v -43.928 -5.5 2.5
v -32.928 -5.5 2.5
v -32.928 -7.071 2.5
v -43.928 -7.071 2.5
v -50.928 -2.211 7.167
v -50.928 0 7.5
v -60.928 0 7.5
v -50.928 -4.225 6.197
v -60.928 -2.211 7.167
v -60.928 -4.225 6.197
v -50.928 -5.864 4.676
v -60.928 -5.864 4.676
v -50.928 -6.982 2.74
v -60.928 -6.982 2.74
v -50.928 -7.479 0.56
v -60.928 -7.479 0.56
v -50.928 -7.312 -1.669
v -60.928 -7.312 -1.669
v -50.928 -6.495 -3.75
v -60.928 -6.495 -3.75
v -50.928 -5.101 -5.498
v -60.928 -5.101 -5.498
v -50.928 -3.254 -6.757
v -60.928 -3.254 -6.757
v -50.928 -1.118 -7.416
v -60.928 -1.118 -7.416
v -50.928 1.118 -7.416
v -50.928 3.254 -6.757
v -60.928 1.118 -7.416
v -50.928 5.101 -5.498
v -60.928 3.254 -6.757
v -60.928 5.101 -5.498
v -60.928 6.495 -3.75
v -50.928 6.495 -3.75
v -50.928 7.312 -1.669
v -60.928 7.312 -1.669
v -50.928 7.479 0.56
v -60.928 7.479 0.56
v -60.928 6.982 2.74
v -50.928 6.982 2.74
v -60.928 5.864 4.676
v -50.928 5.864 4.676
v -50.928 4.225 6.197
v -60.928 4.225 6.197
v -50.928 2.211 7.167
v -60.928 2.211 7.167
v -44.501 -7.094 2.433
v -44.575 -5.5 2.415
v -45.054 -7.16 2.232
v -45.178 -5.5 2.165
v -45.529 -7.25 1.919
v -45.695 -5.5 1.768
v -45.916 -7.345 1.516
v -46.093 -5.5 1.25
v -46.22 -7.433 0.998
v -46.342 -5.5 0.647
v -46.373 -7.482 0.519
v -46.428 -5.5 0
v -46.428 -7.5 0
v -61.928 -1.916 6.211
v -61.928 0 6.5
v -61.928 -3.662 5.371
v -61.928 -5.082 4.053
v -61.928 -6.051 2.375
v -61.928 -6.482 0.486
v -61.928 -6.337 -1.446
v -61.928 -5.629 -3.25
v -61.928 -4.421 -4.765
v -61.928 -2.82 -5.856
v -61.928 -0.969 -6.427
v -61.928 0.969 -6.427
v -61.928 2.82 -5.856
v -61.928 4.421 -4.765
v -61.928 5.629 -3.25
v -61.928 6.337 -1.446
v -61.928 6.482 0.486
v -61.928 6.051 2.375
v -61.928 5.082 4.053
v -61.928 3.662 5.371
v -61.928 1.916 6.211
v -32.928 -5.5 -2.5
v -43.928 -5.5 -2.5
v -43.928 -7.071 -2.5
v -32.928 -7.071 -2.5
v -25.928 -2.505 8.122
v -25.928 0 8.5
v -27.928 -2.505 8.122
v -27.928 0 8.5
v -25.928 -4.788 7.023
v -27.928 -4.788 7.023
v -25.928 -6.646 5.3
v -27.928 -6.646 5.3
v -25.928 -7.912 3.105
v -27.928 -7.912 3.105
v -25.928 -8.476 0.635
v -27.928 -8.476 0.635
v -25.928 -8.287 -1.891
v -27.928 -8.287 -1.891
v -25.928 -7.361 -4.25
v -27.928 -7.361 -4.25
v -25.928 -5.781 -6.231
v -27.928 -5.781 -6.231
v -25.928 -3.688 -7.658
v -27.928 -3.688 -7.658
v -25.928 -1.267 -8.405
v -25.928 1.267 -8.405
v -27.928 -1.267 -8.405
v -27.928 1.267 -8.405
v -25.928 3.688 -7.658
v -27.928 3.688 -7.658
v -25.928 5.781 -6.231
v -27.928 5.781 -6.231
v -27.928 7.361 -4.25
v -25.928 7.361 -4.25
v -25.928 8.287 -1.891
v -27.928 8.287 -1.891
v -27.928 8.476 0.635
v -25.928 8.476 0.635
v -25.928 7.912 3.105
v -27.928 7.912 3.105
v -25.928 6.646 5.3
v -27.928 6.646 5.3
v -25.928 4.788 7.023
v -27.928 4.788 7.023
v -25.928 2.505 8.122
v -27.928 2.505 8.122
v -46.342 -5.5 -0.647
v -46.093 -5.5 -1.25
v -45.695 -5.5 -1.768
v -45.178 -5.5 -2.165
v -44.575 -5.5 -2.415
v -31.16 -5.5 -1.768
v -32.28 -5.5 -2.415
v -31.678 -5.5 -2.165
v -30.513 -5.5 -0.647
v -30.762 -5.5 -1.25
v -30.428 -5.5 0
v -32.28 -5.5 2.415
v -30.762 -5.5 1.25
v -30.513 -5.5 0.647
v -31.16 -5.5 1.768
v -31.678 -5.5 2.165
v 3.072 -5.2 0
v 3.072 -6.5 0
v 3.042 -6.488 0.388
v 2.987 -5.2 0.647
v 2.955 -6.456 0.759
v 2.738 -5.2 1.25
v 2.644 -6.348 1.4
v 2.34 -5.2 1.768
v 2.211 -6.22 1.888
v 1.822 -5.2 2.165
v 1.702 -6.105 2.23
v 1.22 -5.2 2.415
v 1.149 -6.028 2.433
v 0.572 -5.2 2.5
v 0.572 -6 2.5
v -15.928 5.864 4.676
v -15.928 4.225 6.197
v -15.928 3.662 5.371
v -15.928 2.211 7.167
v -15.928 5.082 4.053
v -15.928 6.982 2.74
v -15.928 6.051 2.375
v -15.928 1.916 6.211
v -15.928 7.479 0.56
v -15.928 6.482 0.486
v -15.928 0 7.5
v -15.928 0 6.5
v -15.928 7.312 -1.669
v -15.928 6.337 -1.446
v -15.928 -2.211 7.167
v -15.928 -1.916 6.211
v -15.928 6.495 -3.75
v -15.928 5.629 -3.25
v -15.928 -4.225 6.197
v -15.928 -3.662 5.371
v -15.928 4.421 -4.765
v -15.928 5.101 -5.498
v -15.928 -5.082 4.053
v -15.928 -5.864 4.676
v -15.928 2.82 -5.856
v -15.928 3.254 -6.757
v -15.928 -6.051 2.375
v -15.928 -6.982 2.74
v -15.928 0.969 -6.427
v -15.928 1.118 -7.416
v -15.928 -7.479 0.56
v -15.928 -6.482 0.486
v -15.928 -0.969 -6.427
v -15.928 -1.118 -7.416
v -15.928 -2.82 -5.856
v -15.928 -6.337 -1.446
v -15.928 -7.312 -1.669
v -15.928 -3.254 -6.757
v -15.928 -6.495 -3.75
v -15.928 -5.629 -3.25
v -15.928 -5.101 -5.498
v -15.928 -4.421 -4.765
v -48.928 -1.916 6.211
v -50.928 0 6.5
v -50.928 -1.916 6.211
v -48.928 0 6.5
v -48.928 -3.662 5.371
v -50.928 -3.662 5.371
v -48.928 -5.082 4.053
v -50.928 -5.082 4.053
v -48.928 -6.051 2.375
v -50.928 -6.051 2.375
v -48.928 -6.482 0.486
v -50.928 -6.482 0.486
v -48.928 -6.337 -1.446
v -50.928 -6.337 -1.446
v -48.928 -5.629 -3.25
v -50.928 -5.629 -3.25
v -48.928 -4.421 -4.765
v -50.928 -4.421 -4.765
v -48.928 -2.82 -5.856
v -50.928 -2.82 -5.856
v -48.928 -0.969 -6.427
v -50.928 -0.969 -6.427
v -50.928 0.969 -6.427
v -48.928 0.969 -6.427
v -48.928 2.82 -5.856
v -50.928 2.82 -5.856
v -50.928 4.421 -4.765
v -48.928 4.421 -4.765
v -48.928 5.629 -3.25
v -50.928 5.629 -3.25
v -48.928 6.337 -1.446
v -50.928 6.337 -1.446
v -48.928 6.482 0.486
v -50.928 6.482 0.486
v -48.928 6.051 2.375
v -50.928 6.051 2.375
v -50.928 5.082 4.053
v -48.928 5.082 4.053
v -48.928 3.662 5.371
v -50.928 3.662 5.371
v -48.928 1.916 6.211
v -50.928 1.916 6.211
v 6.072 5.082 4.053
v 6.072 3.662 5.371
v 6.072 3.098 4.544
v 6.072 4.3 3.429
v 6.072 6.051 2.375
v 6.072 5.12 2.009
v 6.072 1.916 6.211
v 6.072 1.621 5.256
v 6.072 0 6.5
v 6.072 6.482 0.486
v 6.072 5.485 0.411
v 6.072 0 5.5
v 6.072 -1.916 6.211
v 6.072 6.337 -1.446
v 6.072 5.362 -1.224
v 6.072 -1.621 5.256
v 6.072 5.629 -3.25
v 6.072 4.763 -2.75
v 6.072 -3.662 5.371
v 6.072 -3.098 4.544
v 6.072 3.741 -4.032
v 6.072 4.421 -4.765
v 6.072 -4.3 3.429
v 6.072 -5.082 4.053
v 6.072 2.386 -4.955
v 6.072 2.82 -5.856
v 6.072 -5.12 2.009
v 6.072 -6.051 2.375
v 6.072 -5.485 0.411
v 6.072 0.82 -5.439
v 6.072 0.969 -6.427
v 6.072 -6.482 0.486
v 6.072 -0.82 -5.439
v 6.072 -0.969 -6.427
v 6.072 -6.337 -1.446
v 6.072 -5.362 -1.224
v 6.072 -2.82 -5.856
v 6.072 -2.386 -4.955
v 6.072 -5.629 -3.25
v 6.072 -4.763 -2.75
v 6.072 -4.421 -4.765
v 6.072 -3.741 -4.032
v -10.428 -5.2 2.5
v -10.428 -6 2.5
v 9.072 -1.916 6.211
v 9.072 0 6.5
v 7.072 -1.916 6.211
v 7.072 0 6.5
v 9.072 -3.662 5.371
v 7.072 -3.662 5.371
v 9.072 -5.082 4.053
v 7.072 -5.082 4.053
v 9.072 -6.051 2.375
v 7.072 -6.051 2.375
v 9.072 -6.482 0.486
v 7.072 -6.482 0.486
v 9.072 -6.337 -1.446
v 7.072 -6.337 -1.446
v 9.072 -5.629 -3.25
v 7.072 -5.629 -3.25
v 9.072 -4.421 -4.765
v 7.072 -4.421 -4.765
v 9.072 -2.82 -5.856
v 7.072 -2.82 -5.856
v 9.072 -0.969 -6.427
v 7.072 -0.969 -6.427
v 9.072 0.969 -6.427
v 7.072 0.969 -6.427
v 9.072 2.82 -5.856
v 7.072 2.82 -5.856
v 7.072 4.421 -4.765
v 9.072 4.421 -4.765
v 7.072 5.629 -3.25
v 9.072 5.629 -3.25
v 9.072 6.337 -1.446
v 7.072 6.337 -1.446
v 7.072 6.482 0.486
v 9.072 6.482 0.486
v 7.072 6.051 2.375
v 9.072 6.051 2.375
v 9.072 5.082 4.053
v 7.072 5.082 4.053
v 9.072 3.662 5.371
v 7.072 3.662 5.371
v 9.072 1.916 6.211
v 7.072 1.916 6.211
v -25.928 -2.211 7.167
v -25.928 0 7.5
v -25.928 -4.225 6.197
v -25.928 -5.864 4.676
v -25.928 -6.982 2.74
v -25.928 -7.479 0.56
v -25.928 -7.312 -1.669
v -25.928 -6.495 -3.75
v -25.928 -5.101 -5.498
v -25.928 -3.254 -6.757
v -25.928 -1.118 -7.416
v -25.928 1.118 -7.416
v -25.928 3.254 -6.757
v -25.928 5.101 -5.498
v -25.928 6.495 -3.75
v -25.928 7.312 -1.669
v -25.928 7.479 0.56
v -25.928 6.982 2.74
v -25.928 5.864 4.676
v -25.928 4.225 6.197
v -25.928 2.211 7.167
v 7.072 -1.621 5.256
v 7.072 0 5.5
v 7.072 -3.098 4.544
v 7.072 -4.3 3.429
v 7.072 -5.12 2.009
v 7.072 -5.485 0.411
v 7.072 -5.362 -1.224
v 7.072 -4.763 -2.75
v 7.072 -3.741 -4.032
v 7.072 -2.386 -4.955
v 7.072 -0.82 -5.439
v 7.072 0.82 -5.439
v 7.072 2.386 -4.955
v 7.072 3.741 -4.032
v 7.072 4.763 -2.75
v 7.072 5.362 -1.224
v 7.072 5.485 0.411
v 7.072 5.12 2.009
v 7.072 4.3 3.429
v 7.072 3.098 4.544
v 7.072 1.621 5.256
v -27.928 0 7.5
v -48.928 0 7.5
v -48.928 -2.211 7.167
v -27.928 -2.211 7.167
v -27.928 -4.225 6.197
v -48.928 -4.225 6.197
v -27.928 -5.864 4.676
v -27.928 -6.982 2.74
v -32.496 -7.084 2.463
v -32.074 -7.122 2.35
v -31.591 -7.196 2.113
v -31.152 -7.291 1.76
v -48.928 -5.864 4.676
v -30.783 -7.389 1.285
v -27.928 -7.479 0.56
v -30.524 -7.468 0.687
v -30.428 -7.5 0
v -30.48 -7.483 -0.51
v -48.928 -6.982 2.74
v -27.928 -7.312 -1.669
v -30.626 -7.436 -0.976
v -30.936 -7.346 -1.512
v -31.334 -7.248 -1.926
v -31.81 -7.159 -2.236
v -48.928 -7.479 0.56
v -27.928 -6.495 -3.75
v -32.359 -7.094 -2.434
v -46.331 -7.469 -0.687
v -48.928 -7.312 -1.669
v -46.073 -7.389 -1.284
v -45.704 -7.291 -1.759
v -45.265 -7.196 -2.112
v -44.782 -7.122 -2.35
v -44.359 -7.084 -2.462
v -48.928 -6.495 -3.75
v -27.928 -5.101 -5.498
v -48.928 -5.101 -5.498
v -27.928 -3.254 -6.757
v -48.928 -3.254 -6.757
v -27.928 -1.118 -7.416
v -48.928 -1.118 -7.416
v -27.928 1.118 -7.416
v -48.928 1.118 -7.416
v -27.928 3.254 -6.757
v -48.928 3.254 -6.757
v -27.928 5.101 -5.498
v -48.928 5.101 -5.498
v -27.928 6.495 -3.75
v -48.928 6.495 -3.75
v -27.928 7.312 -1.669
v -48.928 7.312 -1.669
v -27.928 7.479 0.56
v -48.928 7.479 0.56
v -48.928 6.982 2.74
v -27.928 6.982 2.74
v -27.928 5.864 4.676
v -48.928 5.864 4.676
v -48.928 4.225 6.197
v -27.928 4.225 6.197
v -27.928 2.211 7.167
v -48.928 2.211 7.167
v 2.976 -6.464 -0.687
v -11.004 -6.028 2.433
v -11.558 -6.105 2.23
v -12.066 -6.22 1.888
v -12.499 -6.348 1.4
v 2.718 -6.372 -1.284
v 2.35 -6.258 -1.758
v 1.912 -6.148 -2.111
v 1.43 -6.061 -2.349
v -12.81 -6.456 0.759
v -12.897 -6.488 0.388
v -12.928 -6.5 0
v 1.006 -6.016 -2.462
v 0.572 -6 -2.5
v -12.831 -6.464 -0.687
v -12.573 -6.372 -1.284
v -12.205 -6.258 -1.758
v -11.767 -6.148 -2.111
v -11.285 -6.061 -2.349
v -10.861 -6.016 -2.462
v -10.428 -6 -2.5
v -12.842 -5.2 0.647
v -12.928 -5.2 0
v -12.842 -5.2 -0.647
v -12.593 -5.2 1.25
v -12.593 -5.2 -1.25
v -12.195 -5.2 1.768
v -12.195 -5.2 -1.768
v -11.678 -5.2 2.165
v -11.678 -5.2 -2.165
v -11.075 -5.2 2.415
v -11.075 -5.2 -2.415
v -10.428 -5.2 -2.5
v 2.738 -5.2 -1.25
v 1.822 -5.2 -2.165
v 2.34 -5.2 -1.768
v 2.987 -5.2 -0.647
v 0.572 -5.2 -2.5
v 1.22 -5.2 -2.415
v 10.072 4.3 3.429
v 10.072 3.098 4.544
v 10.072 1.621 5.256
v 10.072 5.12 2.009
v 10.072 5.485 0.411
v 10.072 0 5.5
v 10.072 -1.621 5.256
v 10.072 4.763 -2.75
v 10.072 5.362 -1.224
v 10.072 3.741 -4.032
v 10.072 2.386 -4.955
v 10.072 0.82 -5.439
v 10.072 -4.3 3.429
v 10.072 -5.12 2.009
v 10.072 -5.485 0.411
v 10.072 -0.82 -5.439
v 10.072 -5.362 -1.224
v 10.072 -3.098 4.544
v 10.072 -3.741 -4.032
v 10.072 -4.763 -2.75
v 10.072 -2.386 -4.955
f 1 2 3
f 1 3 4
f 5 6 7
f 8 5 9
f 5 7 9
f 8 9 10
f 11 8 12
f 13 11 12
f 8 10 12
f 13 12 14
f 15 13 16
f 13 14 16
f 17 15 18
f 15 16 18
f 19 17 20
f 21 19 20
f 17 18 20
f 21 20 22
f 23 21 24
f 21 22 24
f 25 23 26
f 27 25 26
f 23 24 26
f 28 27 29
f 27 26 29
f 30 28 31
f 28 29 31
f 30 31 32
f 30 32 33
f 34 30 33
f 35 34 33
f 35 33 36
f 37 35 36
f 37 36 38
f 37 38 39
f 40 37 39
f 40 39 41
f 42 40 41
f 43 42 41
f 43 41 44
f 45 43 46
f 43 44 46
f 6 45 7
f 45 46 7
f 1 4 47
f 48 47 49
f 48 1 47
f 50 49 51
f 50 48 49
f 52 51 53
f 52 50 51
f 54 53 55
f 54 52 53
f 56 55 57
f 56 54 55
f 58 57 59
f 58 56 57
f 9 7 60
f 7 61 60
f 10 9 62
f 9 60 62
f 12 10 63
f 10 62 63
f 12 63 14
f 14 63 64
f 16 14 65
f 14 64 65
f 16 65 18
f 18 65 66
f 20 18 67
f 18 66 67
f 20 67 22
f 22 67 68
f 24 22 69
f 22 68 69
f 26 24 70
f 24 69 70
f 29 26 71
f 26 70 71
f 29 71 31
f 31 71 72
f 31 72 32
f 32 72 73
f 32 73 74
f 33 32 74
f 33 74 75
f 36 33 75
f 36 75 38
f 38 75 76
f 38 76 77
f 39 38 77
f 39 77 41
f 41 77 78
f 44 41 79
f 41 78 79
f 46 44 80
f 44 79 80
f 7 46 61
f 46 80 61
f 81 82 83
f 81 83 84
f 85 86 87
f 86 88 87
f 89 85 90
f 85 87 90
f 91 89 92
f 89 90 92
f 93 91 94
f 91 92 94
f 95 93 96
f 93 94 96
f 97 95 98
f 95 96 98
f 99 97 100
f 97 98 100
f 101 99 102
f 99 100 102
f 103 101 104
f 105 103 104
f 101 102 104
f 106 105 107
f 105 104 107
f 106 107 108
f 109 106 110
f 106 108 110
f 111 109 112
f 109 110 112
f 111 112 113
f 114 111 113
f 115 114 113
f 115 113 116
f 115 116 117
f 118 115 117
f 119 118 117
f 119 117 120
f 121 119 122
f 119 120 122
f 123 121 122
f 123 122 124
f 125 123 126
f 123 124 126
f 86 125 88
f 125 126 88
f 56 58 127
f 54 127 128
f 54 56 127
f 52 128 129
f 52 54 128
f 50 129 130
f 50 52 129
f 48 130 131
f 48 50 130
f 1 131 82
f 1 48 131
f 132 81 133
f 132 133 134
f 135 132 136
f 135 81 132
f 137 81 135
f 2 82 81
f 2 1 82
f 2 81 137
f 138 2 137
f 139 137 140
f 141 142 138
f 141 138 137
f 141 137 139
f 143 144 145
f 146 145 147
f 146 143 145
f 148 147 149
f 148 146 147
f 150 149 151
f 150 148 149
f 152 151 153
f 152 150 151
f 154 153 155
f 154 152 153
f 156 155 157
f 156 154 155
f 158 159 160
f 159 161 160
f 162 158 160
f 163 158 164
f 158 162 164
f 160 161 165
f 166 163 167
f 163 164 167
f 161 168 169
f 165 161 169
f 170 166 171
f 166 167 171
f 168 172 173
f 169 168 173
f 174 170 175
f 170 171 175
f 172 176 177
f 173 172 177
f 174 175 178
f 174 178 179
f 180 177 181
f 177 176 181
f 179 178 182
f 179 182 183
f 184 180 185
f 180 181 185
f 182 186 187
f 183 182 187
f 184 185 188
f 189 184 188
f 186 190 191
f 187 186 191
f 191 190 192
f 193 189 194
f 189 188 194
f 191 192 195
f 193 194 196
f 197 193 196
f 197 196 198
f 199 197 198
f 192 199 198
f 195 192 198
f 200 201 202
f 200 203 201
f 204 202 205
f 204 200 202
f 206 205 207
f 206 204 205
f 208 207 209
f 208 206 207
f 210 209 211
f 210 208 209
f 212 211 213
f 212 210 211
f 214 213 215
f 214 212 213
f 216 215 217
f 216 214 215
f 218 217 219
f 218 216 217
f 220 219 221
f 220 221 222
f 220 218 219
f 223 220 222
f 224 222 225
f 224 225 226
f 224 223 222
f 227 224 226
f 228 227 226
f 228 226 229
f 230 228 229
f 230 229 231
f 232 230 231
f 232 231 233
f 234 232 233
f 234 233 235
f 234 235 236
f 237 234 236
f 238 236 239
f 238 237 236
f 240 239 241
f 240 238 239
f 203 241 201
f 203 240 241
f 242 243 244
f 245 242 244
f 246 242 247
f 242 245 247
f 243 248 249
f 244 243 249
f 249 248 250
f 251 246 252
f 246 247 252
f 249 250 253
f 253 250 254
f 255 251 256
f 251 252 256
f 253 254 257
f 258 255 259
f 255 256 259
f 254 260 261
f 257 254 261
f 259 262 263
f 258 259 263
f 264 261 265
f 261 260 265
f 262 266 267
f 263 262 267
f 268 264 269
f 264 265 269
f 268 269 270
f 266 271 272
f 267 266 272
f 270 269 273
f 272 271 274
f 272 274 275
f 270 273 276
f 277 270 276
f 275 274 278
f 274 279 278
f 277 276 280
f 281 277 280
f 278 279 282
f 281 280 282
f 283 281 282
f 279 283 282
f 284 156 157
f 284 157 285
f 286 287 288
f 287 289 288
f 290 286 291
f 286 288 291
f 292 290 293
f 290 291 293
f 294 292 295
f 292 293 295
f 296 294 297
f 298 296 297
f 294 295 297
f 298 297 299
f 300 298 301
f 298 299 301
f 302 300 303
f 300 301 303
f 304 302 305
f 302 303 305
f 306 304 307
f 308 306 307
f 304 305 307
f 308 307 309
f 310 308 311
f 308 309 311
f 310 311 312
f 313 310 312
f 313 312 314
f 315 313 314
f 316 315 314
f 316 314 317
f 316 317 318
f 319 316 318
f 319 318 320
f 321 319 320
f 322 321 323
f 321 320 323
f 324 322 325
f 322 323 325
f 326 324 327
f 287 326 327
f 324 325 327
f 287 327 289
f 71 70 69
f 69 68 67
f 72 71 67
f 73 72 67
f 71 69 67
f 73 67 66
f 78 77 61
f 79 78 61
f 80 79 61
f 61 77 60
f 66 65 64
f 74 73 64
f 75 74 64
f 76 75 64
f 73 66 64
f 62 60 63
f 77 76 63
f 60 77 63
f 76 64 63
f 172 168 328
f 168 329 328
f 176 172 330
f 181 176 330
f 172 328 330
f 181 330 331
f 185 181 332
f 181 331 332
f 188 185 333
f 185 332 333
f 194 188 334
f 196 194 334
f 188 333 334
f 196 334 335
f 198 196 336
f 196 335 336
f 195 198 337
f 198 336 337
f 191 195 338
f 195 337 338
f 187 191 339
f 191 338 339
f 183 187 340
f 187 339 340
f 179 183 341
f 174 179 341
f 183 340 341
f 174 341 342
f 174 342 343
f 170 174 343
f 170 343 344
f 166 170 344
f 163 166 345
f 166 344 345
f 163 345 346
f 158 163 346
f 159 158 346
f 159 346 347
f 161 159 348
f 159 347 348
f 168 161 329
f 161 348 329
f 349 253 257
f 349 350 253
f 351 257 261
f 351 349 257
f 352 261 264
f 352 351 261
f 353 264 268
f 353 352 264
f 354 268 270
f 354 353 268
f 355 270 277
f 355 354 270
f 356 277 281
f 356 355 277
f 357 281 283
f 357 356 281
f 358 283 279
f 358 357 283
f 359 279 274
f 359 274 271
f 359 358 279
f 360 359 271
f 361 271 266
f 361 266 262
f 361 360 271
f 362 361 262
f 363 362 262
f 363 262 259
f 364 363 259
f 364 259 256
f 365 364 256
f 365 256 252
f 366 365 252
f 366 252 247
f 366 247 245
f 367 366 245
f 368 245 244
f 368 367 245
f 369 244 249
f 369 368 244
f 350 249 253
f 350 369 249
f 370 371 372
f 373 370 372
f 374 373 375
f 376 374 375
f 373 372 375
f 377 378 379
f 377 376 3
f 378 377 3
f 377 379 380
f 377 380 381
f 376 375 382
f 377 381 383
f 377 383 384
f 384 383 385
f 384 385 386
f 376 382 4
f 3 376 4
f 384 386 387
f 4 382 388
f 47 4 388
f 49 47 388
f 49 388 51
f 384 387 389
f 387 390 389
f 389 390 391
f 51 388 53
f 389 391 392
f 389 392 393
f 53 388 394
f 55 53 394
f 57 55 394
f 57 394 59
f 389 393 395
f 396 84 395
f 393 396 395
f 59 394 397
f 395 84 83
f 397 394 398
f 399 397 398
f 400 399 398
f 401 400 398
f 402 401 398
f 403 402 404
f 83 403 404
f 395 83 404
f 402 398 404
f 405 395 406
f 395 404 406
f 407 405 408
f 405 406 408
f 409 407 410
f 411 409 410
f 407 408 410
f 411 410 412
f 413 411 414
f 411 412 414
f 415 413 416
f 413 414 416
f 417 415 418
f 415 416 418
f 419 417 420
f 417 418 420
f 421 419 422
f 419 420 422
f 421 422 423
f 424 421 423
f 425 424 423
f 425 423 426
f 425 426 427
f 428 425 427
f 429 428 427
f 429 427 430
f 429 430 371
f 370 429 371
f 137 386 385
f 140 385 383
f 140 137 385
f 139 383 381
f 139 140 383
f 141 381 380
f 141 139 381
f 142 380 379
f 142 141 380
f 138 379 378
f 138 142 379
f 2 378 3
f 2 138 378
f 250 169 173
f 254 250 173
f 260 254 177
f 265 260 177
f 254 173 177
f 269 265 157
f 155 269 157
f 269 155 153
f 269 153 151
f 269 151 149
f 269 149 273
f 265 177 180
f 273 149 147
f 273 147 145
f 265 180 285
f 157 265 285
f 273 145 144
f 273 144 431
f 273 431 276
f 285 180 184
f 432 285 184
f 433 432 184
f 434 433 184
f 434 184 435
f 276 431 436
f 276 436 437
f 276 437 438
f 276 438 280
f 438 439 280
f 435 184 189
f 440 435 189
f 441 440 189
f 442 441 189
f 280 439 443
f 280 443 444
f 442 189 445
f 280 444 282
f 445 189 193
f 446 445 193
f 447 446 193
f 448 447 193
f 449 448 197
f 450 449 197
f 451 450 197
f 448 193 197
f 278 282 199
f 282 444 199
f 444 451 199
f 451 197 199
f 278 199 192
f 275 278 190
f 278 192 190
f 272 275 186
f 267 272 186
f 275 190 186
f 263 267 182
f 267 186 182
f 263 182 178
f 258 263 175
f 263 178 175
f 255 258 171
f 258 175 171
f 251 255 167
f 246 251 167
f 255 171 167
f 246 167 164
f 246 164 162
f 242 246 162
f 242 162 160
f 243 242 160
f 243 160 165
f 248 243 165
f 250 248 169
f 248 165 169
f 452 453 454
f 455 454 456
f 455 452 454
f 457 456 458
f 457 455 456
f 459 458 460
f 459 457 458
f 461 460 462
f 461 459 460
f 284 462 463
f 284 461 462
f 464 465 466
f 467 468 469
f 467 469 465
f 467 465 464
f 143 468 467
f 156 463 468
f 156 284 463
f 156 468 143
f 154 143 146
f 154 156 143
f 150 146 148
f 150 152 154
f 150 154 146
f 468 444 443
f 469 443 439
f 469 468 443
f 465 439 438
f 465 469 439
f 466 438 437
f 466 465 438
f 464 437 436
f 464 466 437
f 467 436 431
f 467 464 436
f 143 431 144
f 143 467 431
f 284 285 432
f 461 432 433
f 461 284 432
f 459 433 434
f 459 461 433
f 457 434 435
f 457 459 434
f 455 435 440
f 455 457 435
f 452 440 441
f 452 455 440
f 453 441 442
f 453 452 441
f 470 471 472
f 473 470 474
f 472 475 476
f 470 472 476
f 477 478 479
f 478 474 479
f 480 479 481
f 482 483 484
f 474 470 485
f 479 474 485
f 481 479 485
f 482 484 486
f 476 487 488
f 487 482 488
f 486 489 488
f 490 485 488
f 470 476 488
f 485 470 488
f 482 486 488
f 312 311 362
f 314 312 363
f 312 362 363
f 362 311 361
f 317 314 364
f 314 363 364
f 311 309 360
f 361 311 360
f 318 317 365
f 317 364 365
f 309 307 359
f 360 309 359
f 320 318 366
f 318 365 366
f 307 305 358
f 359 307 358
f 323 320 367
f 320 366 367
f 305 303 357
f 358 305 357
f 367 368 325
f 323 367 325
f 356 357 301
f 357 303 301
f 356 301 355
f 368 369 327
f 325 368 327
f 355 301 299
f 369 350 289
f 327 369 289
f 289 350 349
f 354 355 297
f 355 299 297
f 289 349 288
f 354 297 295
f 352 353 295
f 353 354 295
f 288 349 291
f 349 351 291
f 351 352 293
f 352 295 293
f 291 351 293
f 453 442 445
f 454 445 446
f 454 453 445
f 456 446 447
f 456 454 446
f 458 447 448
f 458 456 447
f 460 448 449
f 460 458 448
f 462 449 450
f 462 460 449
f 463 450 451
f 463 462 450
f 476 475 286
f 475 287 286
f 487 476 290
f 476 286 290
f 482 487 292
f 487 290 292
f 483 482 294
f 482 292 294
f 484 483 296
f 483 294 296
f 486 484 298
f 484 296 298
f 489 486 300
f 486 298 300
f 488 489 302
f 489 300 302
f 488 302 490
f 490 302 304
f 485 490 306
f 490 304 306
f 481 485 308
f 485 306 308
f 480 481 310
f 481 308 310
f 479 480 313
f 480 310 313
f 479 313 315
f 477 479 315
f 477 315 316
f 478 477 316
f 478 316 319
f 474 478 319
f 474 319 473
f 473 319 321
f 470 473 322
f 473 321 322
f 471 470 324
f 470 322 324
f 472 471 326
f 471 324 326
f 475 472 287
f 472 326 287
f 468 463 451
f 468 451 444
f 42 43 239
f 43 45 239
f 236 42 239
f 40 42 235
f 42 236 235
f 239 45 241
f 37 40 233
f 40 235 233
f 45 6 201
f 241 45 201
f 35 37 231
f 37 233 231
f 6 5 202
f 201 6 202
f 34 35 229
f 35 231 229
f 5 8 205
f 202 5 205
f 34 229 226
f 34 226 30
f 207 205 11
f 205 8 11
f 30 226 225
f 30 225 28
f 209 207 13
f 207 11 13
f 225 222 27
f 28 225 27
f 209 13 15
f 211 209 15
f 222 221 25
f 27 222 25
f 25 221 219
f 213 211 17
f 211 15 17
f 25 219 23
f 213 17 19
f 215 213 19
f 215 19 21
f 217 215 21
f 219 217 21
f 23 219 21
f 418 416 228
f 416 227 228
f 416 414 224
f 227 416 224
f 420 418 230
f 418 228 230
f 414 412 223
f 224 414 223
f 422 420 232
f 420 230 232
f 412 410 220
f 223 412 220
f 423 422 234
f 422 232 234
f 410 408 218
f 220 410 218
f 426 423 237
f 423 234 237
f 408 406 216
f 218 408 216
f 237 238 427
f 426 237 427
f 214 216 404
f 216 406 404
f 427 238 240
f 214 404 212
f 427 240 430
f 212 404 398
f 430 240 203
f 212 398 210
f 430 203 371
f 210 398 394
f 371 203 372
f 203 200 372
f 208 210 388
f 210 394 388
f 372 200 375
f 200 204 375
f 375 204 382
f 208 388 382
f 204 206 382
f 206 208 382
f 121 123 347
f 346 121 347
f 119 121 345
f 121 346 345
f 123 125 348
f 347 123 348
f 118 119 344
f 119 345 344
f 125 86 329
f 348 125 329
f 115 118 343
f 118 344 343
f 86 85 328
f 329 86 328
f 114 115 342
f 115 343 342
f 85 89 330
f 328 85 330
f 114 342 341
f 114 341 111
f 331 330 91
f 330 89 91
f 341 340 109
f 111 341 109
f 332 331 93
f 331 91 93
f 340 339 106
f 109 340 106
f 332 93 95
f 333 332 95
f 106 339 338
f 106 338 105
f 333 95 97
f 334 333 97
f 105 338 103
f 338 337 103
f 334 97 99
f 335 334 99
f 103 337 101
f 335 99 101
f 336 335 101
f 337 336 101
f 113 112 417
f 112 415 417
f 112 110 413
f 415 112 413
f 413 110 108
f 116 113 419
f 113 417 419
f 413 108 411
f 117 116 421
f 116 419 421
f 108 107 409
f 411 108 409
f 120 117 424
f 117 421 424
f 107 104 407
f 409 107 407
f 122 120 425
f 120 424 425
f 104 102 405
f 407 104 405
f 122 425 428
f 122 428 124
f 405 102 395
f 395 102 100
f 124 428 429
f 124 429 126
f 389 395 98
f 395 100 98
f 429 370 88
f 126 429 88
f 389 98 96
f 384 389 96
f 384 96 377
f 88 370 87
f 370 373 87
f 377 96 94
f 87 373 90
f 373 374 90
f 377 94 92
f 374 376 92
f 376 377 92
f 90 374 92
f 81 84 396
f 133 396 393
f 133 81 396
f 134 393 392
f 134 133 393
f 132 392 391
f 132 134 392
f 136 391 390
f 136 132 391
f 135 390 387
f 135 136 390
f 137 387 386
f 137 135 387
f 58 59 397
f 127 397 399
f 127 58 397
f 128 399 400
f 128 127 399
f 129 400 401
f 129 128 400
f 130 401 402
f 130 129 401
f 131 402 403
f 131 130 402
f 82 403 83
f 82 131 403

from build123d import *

# Parameters (mm, degrees)
F0_W     = 1
F0_H     = 5.5
F0_H_2   = 7.5
F0_W_2   = 2
F0_H_3   = 6.5
F2_DEPTH = 25
F3_DEPTH = 5.5
F4_DEPTH = 5.2


with BuildPart() as f1:
    # F0 (on Front) → F1 (revolve)
    with BuildSketch(Plane.XZ):
        Polygon((9.0724842548, 6.5), (9.0724842548, 0), (10.0724842548, 0), (10.0724842548, 5.5), align=None)
        Polygon((7.0724842548, 6.5), (7.0724842548, 5.5), (7.0724842548, 0), (9.0724842548, 0), (9.0724842548, 6.5), align=None)
        with Locations((6.5724842548, 2.75)):
            Rectangle(F0_W, F0_H)
        with BuildLine():
            Line((-15.9275157452, 6.5), (-15.9275157452, 0))
            Line((-15.9275157452, 0), (-12.9275157452, 0))
            ThreePointArc((-12.9275157452, 0), (-12.1952826981, 1.767766953), (-10.4275157452, 2.5))
            Line((-10.4275157452, 2.5), (0.5724842548, 2.5))
            ThreePointArc((0.5724842548, 2.5), (2.3402512078, 1.767766953), (3.0724842548, 0))
            Line((3.0724842548, 0), (6.0724842548, 0))
            Line((6.0724842548, 0), (6.0724842548, 5.5))
            Line((6.0724842548, 5.5), (6.0724842548, 6.5))
            Line((6.0724842548, 6.5), (-15.9275157452, 6.5))
        make_face()
        with BuildLine():
            ThreePointArc((-10.4275157452, 2.5), (-12.1952826981, 1.767766953), (-12.9275157452, 0))
            Line((-12.9275157452, 0), (3.0724842548, 0))
            ThreePointArc((3.0724842548, 0), (2.3402512078, 1.767766953), (0.5724842548, 2.5))
            Line((0.5724842548, 2.5), (-10.4275157452, 2.5))
        make_face()
        Polygon((-24.9275157452, 7.5), (-24.9275157452, 0), (-15.9275157452, 0), (-15.9275157452, 6.5), (-15.9275157452, 7.5), align=None)
        with Locations((-25.4275157452, 3.75)):
            Rectangle(F0_W, F0_H_2)
        Polygon((-27.9275157452, 8.5), (-27.9275157452, 7.5), (-27.9275157452, 0), (-25.9275157452, 0), (-25.9275157452, 7.5), (-25.9275157452, 8.5), align=None)
        with BuildLine():
            Line((-27.9275157452, 7.5), (-48.9275157452, 7.5))
            Line((-48.9275157452, 7.5), (-48.9275157452, 6.5))
            Line((-48.9275157452, 6.5), (-48.9275157452, 0))
            Line((-48.9275157452, 0), (-46.4275157452, 0))
            ThreePointArc((-46.4275157452, 0), (-45.6952826981, 1.767766953), (-43.9275157452, 2.5))
            Line((-43.9275157452, 2.5), (-32.9275157452, 2.5))
            ThreePointArc((-32.9275157452, 2.5), (-31.1597487922, 1.767766953), (-30.4275157452, 0))
            Line((-30.4275157452, 0), (-27.9275157452, 0))
            Line((-27.9275157452, 0), (-27.9275157452, 7.5))
        make_face()
        with BuildLine():
            ThreePointArc((-43.9275157452, 2.5), (-45.6952826981, 1.767766953), (-46.4275157452, 0))
            Line((-46.4275157452, 0), (-30.4275157452, 0))
            ThreePointArc((-30.4275157452, 0), (-31.1597487922, 1.767766953), (-32.9275157452, 2.5))
            Line((-32.9275157452, 2.5), (-43.9275157452, 2.5))
        make_face()
        with Locations((-49.9275157452, 3.25)):
            Rectangle(F0_W_2, F0_H_3)
        Polygon((-50.9275157452, 0), (-50.9275157452, 6.5), (-50.9275157452, 7.5), (-60.9275157452, 7.5), (-60.9275157452, 0), align=None)
        Polygon((-61.9275157452, 0), (-60.9275157452, 0), (-60.9275157452, 7.5), (-61.9275157452, 6.5), align=None)
    revolve(axis=Axis((-25.9275157452, 0, 0), (1, 0, 0)))

    # F0 (on Front) → F2 (cut)
    with BuildSketch(Plane.XZ):
        with BuildLine():
            Line((-30.4275157452, 0), (-46.4275157452, 0))
            ThreePointArc((-46.4275157452, 0), (-45.6952826981, -1.767766953), (-43.9275157452, -2.5))
            Line((-43.9275157452, -2.5), (-32.9275157452, -2.5))
            ThreePointArc((-32.9275157452, -2.5), (-31.1597487922, -1.767766953), (-30.4275157452, 0))
        make_face()
        with BuildLine():
            ThreePointArc((-43.9275157452, 2.5), (-45.6952826981, 1.767766953), (-46.4275157452, 0))
            Line((-46.4275157452, 0), (-30.4275157452, 0))
            ThreePointArc((-30.4275157452, 0), (-31.1597487922, 1.767766953), (-32.9275157452, 2.5))
            Line((-32.9275157452, 2.5), (-43.9275157452, 2.5))
        make_face()
        with BuildLine():
            ThreePointArc((-10.4275157452, 2.5), (-12.1952826981, 1.767766953), (-12.9275157452, 0))
            Line((-12.9275157452, 0), (3.0724842548, 0))
            ThreePointArc((3.0724842548, 0), (2.3402512078, 1.767766953), (0.5724842548, 2.5))
            Line((0.5724842548, 2.5), (-10.4275157452, 2.5))
        make_face()
        with BuildLine():
            Line((3.0724842548, 0), (-12.9275157452, 0))
            ThreePointArc((-12.9275157452, 0), (-12.1952826981, -1.767766953), (-10.4275157452, -2.5))
            Line((-10.4275157452, -2.5), (0.5724842548, -2.5))
            ThreePointArc((0.5724842548, -2.5), (2.3402512078, -1.767766953), (3.0724842548, 0))
        make_face()
    extrude(amount=F2_DEPTH, mode=Mode.SUBTRACT)

    # F3 (add): a face of the model
    f3_faces = [f1.faces().sort_by_distance(p)[0] for p in [
        (-38.4275157452, 0, 0),
    ]]
    extrude(f3_faces, amount=F3_DEPTH)

    # F4 (add): a face of the model
    f4_faces = [f1.faces().sort_by_distance(p)[0] for p in [
        (-4.9275157452, 0, 0),
    ]]
    extrude(f4_faces, amount=F4_DEPTH)


solid = f1.part
